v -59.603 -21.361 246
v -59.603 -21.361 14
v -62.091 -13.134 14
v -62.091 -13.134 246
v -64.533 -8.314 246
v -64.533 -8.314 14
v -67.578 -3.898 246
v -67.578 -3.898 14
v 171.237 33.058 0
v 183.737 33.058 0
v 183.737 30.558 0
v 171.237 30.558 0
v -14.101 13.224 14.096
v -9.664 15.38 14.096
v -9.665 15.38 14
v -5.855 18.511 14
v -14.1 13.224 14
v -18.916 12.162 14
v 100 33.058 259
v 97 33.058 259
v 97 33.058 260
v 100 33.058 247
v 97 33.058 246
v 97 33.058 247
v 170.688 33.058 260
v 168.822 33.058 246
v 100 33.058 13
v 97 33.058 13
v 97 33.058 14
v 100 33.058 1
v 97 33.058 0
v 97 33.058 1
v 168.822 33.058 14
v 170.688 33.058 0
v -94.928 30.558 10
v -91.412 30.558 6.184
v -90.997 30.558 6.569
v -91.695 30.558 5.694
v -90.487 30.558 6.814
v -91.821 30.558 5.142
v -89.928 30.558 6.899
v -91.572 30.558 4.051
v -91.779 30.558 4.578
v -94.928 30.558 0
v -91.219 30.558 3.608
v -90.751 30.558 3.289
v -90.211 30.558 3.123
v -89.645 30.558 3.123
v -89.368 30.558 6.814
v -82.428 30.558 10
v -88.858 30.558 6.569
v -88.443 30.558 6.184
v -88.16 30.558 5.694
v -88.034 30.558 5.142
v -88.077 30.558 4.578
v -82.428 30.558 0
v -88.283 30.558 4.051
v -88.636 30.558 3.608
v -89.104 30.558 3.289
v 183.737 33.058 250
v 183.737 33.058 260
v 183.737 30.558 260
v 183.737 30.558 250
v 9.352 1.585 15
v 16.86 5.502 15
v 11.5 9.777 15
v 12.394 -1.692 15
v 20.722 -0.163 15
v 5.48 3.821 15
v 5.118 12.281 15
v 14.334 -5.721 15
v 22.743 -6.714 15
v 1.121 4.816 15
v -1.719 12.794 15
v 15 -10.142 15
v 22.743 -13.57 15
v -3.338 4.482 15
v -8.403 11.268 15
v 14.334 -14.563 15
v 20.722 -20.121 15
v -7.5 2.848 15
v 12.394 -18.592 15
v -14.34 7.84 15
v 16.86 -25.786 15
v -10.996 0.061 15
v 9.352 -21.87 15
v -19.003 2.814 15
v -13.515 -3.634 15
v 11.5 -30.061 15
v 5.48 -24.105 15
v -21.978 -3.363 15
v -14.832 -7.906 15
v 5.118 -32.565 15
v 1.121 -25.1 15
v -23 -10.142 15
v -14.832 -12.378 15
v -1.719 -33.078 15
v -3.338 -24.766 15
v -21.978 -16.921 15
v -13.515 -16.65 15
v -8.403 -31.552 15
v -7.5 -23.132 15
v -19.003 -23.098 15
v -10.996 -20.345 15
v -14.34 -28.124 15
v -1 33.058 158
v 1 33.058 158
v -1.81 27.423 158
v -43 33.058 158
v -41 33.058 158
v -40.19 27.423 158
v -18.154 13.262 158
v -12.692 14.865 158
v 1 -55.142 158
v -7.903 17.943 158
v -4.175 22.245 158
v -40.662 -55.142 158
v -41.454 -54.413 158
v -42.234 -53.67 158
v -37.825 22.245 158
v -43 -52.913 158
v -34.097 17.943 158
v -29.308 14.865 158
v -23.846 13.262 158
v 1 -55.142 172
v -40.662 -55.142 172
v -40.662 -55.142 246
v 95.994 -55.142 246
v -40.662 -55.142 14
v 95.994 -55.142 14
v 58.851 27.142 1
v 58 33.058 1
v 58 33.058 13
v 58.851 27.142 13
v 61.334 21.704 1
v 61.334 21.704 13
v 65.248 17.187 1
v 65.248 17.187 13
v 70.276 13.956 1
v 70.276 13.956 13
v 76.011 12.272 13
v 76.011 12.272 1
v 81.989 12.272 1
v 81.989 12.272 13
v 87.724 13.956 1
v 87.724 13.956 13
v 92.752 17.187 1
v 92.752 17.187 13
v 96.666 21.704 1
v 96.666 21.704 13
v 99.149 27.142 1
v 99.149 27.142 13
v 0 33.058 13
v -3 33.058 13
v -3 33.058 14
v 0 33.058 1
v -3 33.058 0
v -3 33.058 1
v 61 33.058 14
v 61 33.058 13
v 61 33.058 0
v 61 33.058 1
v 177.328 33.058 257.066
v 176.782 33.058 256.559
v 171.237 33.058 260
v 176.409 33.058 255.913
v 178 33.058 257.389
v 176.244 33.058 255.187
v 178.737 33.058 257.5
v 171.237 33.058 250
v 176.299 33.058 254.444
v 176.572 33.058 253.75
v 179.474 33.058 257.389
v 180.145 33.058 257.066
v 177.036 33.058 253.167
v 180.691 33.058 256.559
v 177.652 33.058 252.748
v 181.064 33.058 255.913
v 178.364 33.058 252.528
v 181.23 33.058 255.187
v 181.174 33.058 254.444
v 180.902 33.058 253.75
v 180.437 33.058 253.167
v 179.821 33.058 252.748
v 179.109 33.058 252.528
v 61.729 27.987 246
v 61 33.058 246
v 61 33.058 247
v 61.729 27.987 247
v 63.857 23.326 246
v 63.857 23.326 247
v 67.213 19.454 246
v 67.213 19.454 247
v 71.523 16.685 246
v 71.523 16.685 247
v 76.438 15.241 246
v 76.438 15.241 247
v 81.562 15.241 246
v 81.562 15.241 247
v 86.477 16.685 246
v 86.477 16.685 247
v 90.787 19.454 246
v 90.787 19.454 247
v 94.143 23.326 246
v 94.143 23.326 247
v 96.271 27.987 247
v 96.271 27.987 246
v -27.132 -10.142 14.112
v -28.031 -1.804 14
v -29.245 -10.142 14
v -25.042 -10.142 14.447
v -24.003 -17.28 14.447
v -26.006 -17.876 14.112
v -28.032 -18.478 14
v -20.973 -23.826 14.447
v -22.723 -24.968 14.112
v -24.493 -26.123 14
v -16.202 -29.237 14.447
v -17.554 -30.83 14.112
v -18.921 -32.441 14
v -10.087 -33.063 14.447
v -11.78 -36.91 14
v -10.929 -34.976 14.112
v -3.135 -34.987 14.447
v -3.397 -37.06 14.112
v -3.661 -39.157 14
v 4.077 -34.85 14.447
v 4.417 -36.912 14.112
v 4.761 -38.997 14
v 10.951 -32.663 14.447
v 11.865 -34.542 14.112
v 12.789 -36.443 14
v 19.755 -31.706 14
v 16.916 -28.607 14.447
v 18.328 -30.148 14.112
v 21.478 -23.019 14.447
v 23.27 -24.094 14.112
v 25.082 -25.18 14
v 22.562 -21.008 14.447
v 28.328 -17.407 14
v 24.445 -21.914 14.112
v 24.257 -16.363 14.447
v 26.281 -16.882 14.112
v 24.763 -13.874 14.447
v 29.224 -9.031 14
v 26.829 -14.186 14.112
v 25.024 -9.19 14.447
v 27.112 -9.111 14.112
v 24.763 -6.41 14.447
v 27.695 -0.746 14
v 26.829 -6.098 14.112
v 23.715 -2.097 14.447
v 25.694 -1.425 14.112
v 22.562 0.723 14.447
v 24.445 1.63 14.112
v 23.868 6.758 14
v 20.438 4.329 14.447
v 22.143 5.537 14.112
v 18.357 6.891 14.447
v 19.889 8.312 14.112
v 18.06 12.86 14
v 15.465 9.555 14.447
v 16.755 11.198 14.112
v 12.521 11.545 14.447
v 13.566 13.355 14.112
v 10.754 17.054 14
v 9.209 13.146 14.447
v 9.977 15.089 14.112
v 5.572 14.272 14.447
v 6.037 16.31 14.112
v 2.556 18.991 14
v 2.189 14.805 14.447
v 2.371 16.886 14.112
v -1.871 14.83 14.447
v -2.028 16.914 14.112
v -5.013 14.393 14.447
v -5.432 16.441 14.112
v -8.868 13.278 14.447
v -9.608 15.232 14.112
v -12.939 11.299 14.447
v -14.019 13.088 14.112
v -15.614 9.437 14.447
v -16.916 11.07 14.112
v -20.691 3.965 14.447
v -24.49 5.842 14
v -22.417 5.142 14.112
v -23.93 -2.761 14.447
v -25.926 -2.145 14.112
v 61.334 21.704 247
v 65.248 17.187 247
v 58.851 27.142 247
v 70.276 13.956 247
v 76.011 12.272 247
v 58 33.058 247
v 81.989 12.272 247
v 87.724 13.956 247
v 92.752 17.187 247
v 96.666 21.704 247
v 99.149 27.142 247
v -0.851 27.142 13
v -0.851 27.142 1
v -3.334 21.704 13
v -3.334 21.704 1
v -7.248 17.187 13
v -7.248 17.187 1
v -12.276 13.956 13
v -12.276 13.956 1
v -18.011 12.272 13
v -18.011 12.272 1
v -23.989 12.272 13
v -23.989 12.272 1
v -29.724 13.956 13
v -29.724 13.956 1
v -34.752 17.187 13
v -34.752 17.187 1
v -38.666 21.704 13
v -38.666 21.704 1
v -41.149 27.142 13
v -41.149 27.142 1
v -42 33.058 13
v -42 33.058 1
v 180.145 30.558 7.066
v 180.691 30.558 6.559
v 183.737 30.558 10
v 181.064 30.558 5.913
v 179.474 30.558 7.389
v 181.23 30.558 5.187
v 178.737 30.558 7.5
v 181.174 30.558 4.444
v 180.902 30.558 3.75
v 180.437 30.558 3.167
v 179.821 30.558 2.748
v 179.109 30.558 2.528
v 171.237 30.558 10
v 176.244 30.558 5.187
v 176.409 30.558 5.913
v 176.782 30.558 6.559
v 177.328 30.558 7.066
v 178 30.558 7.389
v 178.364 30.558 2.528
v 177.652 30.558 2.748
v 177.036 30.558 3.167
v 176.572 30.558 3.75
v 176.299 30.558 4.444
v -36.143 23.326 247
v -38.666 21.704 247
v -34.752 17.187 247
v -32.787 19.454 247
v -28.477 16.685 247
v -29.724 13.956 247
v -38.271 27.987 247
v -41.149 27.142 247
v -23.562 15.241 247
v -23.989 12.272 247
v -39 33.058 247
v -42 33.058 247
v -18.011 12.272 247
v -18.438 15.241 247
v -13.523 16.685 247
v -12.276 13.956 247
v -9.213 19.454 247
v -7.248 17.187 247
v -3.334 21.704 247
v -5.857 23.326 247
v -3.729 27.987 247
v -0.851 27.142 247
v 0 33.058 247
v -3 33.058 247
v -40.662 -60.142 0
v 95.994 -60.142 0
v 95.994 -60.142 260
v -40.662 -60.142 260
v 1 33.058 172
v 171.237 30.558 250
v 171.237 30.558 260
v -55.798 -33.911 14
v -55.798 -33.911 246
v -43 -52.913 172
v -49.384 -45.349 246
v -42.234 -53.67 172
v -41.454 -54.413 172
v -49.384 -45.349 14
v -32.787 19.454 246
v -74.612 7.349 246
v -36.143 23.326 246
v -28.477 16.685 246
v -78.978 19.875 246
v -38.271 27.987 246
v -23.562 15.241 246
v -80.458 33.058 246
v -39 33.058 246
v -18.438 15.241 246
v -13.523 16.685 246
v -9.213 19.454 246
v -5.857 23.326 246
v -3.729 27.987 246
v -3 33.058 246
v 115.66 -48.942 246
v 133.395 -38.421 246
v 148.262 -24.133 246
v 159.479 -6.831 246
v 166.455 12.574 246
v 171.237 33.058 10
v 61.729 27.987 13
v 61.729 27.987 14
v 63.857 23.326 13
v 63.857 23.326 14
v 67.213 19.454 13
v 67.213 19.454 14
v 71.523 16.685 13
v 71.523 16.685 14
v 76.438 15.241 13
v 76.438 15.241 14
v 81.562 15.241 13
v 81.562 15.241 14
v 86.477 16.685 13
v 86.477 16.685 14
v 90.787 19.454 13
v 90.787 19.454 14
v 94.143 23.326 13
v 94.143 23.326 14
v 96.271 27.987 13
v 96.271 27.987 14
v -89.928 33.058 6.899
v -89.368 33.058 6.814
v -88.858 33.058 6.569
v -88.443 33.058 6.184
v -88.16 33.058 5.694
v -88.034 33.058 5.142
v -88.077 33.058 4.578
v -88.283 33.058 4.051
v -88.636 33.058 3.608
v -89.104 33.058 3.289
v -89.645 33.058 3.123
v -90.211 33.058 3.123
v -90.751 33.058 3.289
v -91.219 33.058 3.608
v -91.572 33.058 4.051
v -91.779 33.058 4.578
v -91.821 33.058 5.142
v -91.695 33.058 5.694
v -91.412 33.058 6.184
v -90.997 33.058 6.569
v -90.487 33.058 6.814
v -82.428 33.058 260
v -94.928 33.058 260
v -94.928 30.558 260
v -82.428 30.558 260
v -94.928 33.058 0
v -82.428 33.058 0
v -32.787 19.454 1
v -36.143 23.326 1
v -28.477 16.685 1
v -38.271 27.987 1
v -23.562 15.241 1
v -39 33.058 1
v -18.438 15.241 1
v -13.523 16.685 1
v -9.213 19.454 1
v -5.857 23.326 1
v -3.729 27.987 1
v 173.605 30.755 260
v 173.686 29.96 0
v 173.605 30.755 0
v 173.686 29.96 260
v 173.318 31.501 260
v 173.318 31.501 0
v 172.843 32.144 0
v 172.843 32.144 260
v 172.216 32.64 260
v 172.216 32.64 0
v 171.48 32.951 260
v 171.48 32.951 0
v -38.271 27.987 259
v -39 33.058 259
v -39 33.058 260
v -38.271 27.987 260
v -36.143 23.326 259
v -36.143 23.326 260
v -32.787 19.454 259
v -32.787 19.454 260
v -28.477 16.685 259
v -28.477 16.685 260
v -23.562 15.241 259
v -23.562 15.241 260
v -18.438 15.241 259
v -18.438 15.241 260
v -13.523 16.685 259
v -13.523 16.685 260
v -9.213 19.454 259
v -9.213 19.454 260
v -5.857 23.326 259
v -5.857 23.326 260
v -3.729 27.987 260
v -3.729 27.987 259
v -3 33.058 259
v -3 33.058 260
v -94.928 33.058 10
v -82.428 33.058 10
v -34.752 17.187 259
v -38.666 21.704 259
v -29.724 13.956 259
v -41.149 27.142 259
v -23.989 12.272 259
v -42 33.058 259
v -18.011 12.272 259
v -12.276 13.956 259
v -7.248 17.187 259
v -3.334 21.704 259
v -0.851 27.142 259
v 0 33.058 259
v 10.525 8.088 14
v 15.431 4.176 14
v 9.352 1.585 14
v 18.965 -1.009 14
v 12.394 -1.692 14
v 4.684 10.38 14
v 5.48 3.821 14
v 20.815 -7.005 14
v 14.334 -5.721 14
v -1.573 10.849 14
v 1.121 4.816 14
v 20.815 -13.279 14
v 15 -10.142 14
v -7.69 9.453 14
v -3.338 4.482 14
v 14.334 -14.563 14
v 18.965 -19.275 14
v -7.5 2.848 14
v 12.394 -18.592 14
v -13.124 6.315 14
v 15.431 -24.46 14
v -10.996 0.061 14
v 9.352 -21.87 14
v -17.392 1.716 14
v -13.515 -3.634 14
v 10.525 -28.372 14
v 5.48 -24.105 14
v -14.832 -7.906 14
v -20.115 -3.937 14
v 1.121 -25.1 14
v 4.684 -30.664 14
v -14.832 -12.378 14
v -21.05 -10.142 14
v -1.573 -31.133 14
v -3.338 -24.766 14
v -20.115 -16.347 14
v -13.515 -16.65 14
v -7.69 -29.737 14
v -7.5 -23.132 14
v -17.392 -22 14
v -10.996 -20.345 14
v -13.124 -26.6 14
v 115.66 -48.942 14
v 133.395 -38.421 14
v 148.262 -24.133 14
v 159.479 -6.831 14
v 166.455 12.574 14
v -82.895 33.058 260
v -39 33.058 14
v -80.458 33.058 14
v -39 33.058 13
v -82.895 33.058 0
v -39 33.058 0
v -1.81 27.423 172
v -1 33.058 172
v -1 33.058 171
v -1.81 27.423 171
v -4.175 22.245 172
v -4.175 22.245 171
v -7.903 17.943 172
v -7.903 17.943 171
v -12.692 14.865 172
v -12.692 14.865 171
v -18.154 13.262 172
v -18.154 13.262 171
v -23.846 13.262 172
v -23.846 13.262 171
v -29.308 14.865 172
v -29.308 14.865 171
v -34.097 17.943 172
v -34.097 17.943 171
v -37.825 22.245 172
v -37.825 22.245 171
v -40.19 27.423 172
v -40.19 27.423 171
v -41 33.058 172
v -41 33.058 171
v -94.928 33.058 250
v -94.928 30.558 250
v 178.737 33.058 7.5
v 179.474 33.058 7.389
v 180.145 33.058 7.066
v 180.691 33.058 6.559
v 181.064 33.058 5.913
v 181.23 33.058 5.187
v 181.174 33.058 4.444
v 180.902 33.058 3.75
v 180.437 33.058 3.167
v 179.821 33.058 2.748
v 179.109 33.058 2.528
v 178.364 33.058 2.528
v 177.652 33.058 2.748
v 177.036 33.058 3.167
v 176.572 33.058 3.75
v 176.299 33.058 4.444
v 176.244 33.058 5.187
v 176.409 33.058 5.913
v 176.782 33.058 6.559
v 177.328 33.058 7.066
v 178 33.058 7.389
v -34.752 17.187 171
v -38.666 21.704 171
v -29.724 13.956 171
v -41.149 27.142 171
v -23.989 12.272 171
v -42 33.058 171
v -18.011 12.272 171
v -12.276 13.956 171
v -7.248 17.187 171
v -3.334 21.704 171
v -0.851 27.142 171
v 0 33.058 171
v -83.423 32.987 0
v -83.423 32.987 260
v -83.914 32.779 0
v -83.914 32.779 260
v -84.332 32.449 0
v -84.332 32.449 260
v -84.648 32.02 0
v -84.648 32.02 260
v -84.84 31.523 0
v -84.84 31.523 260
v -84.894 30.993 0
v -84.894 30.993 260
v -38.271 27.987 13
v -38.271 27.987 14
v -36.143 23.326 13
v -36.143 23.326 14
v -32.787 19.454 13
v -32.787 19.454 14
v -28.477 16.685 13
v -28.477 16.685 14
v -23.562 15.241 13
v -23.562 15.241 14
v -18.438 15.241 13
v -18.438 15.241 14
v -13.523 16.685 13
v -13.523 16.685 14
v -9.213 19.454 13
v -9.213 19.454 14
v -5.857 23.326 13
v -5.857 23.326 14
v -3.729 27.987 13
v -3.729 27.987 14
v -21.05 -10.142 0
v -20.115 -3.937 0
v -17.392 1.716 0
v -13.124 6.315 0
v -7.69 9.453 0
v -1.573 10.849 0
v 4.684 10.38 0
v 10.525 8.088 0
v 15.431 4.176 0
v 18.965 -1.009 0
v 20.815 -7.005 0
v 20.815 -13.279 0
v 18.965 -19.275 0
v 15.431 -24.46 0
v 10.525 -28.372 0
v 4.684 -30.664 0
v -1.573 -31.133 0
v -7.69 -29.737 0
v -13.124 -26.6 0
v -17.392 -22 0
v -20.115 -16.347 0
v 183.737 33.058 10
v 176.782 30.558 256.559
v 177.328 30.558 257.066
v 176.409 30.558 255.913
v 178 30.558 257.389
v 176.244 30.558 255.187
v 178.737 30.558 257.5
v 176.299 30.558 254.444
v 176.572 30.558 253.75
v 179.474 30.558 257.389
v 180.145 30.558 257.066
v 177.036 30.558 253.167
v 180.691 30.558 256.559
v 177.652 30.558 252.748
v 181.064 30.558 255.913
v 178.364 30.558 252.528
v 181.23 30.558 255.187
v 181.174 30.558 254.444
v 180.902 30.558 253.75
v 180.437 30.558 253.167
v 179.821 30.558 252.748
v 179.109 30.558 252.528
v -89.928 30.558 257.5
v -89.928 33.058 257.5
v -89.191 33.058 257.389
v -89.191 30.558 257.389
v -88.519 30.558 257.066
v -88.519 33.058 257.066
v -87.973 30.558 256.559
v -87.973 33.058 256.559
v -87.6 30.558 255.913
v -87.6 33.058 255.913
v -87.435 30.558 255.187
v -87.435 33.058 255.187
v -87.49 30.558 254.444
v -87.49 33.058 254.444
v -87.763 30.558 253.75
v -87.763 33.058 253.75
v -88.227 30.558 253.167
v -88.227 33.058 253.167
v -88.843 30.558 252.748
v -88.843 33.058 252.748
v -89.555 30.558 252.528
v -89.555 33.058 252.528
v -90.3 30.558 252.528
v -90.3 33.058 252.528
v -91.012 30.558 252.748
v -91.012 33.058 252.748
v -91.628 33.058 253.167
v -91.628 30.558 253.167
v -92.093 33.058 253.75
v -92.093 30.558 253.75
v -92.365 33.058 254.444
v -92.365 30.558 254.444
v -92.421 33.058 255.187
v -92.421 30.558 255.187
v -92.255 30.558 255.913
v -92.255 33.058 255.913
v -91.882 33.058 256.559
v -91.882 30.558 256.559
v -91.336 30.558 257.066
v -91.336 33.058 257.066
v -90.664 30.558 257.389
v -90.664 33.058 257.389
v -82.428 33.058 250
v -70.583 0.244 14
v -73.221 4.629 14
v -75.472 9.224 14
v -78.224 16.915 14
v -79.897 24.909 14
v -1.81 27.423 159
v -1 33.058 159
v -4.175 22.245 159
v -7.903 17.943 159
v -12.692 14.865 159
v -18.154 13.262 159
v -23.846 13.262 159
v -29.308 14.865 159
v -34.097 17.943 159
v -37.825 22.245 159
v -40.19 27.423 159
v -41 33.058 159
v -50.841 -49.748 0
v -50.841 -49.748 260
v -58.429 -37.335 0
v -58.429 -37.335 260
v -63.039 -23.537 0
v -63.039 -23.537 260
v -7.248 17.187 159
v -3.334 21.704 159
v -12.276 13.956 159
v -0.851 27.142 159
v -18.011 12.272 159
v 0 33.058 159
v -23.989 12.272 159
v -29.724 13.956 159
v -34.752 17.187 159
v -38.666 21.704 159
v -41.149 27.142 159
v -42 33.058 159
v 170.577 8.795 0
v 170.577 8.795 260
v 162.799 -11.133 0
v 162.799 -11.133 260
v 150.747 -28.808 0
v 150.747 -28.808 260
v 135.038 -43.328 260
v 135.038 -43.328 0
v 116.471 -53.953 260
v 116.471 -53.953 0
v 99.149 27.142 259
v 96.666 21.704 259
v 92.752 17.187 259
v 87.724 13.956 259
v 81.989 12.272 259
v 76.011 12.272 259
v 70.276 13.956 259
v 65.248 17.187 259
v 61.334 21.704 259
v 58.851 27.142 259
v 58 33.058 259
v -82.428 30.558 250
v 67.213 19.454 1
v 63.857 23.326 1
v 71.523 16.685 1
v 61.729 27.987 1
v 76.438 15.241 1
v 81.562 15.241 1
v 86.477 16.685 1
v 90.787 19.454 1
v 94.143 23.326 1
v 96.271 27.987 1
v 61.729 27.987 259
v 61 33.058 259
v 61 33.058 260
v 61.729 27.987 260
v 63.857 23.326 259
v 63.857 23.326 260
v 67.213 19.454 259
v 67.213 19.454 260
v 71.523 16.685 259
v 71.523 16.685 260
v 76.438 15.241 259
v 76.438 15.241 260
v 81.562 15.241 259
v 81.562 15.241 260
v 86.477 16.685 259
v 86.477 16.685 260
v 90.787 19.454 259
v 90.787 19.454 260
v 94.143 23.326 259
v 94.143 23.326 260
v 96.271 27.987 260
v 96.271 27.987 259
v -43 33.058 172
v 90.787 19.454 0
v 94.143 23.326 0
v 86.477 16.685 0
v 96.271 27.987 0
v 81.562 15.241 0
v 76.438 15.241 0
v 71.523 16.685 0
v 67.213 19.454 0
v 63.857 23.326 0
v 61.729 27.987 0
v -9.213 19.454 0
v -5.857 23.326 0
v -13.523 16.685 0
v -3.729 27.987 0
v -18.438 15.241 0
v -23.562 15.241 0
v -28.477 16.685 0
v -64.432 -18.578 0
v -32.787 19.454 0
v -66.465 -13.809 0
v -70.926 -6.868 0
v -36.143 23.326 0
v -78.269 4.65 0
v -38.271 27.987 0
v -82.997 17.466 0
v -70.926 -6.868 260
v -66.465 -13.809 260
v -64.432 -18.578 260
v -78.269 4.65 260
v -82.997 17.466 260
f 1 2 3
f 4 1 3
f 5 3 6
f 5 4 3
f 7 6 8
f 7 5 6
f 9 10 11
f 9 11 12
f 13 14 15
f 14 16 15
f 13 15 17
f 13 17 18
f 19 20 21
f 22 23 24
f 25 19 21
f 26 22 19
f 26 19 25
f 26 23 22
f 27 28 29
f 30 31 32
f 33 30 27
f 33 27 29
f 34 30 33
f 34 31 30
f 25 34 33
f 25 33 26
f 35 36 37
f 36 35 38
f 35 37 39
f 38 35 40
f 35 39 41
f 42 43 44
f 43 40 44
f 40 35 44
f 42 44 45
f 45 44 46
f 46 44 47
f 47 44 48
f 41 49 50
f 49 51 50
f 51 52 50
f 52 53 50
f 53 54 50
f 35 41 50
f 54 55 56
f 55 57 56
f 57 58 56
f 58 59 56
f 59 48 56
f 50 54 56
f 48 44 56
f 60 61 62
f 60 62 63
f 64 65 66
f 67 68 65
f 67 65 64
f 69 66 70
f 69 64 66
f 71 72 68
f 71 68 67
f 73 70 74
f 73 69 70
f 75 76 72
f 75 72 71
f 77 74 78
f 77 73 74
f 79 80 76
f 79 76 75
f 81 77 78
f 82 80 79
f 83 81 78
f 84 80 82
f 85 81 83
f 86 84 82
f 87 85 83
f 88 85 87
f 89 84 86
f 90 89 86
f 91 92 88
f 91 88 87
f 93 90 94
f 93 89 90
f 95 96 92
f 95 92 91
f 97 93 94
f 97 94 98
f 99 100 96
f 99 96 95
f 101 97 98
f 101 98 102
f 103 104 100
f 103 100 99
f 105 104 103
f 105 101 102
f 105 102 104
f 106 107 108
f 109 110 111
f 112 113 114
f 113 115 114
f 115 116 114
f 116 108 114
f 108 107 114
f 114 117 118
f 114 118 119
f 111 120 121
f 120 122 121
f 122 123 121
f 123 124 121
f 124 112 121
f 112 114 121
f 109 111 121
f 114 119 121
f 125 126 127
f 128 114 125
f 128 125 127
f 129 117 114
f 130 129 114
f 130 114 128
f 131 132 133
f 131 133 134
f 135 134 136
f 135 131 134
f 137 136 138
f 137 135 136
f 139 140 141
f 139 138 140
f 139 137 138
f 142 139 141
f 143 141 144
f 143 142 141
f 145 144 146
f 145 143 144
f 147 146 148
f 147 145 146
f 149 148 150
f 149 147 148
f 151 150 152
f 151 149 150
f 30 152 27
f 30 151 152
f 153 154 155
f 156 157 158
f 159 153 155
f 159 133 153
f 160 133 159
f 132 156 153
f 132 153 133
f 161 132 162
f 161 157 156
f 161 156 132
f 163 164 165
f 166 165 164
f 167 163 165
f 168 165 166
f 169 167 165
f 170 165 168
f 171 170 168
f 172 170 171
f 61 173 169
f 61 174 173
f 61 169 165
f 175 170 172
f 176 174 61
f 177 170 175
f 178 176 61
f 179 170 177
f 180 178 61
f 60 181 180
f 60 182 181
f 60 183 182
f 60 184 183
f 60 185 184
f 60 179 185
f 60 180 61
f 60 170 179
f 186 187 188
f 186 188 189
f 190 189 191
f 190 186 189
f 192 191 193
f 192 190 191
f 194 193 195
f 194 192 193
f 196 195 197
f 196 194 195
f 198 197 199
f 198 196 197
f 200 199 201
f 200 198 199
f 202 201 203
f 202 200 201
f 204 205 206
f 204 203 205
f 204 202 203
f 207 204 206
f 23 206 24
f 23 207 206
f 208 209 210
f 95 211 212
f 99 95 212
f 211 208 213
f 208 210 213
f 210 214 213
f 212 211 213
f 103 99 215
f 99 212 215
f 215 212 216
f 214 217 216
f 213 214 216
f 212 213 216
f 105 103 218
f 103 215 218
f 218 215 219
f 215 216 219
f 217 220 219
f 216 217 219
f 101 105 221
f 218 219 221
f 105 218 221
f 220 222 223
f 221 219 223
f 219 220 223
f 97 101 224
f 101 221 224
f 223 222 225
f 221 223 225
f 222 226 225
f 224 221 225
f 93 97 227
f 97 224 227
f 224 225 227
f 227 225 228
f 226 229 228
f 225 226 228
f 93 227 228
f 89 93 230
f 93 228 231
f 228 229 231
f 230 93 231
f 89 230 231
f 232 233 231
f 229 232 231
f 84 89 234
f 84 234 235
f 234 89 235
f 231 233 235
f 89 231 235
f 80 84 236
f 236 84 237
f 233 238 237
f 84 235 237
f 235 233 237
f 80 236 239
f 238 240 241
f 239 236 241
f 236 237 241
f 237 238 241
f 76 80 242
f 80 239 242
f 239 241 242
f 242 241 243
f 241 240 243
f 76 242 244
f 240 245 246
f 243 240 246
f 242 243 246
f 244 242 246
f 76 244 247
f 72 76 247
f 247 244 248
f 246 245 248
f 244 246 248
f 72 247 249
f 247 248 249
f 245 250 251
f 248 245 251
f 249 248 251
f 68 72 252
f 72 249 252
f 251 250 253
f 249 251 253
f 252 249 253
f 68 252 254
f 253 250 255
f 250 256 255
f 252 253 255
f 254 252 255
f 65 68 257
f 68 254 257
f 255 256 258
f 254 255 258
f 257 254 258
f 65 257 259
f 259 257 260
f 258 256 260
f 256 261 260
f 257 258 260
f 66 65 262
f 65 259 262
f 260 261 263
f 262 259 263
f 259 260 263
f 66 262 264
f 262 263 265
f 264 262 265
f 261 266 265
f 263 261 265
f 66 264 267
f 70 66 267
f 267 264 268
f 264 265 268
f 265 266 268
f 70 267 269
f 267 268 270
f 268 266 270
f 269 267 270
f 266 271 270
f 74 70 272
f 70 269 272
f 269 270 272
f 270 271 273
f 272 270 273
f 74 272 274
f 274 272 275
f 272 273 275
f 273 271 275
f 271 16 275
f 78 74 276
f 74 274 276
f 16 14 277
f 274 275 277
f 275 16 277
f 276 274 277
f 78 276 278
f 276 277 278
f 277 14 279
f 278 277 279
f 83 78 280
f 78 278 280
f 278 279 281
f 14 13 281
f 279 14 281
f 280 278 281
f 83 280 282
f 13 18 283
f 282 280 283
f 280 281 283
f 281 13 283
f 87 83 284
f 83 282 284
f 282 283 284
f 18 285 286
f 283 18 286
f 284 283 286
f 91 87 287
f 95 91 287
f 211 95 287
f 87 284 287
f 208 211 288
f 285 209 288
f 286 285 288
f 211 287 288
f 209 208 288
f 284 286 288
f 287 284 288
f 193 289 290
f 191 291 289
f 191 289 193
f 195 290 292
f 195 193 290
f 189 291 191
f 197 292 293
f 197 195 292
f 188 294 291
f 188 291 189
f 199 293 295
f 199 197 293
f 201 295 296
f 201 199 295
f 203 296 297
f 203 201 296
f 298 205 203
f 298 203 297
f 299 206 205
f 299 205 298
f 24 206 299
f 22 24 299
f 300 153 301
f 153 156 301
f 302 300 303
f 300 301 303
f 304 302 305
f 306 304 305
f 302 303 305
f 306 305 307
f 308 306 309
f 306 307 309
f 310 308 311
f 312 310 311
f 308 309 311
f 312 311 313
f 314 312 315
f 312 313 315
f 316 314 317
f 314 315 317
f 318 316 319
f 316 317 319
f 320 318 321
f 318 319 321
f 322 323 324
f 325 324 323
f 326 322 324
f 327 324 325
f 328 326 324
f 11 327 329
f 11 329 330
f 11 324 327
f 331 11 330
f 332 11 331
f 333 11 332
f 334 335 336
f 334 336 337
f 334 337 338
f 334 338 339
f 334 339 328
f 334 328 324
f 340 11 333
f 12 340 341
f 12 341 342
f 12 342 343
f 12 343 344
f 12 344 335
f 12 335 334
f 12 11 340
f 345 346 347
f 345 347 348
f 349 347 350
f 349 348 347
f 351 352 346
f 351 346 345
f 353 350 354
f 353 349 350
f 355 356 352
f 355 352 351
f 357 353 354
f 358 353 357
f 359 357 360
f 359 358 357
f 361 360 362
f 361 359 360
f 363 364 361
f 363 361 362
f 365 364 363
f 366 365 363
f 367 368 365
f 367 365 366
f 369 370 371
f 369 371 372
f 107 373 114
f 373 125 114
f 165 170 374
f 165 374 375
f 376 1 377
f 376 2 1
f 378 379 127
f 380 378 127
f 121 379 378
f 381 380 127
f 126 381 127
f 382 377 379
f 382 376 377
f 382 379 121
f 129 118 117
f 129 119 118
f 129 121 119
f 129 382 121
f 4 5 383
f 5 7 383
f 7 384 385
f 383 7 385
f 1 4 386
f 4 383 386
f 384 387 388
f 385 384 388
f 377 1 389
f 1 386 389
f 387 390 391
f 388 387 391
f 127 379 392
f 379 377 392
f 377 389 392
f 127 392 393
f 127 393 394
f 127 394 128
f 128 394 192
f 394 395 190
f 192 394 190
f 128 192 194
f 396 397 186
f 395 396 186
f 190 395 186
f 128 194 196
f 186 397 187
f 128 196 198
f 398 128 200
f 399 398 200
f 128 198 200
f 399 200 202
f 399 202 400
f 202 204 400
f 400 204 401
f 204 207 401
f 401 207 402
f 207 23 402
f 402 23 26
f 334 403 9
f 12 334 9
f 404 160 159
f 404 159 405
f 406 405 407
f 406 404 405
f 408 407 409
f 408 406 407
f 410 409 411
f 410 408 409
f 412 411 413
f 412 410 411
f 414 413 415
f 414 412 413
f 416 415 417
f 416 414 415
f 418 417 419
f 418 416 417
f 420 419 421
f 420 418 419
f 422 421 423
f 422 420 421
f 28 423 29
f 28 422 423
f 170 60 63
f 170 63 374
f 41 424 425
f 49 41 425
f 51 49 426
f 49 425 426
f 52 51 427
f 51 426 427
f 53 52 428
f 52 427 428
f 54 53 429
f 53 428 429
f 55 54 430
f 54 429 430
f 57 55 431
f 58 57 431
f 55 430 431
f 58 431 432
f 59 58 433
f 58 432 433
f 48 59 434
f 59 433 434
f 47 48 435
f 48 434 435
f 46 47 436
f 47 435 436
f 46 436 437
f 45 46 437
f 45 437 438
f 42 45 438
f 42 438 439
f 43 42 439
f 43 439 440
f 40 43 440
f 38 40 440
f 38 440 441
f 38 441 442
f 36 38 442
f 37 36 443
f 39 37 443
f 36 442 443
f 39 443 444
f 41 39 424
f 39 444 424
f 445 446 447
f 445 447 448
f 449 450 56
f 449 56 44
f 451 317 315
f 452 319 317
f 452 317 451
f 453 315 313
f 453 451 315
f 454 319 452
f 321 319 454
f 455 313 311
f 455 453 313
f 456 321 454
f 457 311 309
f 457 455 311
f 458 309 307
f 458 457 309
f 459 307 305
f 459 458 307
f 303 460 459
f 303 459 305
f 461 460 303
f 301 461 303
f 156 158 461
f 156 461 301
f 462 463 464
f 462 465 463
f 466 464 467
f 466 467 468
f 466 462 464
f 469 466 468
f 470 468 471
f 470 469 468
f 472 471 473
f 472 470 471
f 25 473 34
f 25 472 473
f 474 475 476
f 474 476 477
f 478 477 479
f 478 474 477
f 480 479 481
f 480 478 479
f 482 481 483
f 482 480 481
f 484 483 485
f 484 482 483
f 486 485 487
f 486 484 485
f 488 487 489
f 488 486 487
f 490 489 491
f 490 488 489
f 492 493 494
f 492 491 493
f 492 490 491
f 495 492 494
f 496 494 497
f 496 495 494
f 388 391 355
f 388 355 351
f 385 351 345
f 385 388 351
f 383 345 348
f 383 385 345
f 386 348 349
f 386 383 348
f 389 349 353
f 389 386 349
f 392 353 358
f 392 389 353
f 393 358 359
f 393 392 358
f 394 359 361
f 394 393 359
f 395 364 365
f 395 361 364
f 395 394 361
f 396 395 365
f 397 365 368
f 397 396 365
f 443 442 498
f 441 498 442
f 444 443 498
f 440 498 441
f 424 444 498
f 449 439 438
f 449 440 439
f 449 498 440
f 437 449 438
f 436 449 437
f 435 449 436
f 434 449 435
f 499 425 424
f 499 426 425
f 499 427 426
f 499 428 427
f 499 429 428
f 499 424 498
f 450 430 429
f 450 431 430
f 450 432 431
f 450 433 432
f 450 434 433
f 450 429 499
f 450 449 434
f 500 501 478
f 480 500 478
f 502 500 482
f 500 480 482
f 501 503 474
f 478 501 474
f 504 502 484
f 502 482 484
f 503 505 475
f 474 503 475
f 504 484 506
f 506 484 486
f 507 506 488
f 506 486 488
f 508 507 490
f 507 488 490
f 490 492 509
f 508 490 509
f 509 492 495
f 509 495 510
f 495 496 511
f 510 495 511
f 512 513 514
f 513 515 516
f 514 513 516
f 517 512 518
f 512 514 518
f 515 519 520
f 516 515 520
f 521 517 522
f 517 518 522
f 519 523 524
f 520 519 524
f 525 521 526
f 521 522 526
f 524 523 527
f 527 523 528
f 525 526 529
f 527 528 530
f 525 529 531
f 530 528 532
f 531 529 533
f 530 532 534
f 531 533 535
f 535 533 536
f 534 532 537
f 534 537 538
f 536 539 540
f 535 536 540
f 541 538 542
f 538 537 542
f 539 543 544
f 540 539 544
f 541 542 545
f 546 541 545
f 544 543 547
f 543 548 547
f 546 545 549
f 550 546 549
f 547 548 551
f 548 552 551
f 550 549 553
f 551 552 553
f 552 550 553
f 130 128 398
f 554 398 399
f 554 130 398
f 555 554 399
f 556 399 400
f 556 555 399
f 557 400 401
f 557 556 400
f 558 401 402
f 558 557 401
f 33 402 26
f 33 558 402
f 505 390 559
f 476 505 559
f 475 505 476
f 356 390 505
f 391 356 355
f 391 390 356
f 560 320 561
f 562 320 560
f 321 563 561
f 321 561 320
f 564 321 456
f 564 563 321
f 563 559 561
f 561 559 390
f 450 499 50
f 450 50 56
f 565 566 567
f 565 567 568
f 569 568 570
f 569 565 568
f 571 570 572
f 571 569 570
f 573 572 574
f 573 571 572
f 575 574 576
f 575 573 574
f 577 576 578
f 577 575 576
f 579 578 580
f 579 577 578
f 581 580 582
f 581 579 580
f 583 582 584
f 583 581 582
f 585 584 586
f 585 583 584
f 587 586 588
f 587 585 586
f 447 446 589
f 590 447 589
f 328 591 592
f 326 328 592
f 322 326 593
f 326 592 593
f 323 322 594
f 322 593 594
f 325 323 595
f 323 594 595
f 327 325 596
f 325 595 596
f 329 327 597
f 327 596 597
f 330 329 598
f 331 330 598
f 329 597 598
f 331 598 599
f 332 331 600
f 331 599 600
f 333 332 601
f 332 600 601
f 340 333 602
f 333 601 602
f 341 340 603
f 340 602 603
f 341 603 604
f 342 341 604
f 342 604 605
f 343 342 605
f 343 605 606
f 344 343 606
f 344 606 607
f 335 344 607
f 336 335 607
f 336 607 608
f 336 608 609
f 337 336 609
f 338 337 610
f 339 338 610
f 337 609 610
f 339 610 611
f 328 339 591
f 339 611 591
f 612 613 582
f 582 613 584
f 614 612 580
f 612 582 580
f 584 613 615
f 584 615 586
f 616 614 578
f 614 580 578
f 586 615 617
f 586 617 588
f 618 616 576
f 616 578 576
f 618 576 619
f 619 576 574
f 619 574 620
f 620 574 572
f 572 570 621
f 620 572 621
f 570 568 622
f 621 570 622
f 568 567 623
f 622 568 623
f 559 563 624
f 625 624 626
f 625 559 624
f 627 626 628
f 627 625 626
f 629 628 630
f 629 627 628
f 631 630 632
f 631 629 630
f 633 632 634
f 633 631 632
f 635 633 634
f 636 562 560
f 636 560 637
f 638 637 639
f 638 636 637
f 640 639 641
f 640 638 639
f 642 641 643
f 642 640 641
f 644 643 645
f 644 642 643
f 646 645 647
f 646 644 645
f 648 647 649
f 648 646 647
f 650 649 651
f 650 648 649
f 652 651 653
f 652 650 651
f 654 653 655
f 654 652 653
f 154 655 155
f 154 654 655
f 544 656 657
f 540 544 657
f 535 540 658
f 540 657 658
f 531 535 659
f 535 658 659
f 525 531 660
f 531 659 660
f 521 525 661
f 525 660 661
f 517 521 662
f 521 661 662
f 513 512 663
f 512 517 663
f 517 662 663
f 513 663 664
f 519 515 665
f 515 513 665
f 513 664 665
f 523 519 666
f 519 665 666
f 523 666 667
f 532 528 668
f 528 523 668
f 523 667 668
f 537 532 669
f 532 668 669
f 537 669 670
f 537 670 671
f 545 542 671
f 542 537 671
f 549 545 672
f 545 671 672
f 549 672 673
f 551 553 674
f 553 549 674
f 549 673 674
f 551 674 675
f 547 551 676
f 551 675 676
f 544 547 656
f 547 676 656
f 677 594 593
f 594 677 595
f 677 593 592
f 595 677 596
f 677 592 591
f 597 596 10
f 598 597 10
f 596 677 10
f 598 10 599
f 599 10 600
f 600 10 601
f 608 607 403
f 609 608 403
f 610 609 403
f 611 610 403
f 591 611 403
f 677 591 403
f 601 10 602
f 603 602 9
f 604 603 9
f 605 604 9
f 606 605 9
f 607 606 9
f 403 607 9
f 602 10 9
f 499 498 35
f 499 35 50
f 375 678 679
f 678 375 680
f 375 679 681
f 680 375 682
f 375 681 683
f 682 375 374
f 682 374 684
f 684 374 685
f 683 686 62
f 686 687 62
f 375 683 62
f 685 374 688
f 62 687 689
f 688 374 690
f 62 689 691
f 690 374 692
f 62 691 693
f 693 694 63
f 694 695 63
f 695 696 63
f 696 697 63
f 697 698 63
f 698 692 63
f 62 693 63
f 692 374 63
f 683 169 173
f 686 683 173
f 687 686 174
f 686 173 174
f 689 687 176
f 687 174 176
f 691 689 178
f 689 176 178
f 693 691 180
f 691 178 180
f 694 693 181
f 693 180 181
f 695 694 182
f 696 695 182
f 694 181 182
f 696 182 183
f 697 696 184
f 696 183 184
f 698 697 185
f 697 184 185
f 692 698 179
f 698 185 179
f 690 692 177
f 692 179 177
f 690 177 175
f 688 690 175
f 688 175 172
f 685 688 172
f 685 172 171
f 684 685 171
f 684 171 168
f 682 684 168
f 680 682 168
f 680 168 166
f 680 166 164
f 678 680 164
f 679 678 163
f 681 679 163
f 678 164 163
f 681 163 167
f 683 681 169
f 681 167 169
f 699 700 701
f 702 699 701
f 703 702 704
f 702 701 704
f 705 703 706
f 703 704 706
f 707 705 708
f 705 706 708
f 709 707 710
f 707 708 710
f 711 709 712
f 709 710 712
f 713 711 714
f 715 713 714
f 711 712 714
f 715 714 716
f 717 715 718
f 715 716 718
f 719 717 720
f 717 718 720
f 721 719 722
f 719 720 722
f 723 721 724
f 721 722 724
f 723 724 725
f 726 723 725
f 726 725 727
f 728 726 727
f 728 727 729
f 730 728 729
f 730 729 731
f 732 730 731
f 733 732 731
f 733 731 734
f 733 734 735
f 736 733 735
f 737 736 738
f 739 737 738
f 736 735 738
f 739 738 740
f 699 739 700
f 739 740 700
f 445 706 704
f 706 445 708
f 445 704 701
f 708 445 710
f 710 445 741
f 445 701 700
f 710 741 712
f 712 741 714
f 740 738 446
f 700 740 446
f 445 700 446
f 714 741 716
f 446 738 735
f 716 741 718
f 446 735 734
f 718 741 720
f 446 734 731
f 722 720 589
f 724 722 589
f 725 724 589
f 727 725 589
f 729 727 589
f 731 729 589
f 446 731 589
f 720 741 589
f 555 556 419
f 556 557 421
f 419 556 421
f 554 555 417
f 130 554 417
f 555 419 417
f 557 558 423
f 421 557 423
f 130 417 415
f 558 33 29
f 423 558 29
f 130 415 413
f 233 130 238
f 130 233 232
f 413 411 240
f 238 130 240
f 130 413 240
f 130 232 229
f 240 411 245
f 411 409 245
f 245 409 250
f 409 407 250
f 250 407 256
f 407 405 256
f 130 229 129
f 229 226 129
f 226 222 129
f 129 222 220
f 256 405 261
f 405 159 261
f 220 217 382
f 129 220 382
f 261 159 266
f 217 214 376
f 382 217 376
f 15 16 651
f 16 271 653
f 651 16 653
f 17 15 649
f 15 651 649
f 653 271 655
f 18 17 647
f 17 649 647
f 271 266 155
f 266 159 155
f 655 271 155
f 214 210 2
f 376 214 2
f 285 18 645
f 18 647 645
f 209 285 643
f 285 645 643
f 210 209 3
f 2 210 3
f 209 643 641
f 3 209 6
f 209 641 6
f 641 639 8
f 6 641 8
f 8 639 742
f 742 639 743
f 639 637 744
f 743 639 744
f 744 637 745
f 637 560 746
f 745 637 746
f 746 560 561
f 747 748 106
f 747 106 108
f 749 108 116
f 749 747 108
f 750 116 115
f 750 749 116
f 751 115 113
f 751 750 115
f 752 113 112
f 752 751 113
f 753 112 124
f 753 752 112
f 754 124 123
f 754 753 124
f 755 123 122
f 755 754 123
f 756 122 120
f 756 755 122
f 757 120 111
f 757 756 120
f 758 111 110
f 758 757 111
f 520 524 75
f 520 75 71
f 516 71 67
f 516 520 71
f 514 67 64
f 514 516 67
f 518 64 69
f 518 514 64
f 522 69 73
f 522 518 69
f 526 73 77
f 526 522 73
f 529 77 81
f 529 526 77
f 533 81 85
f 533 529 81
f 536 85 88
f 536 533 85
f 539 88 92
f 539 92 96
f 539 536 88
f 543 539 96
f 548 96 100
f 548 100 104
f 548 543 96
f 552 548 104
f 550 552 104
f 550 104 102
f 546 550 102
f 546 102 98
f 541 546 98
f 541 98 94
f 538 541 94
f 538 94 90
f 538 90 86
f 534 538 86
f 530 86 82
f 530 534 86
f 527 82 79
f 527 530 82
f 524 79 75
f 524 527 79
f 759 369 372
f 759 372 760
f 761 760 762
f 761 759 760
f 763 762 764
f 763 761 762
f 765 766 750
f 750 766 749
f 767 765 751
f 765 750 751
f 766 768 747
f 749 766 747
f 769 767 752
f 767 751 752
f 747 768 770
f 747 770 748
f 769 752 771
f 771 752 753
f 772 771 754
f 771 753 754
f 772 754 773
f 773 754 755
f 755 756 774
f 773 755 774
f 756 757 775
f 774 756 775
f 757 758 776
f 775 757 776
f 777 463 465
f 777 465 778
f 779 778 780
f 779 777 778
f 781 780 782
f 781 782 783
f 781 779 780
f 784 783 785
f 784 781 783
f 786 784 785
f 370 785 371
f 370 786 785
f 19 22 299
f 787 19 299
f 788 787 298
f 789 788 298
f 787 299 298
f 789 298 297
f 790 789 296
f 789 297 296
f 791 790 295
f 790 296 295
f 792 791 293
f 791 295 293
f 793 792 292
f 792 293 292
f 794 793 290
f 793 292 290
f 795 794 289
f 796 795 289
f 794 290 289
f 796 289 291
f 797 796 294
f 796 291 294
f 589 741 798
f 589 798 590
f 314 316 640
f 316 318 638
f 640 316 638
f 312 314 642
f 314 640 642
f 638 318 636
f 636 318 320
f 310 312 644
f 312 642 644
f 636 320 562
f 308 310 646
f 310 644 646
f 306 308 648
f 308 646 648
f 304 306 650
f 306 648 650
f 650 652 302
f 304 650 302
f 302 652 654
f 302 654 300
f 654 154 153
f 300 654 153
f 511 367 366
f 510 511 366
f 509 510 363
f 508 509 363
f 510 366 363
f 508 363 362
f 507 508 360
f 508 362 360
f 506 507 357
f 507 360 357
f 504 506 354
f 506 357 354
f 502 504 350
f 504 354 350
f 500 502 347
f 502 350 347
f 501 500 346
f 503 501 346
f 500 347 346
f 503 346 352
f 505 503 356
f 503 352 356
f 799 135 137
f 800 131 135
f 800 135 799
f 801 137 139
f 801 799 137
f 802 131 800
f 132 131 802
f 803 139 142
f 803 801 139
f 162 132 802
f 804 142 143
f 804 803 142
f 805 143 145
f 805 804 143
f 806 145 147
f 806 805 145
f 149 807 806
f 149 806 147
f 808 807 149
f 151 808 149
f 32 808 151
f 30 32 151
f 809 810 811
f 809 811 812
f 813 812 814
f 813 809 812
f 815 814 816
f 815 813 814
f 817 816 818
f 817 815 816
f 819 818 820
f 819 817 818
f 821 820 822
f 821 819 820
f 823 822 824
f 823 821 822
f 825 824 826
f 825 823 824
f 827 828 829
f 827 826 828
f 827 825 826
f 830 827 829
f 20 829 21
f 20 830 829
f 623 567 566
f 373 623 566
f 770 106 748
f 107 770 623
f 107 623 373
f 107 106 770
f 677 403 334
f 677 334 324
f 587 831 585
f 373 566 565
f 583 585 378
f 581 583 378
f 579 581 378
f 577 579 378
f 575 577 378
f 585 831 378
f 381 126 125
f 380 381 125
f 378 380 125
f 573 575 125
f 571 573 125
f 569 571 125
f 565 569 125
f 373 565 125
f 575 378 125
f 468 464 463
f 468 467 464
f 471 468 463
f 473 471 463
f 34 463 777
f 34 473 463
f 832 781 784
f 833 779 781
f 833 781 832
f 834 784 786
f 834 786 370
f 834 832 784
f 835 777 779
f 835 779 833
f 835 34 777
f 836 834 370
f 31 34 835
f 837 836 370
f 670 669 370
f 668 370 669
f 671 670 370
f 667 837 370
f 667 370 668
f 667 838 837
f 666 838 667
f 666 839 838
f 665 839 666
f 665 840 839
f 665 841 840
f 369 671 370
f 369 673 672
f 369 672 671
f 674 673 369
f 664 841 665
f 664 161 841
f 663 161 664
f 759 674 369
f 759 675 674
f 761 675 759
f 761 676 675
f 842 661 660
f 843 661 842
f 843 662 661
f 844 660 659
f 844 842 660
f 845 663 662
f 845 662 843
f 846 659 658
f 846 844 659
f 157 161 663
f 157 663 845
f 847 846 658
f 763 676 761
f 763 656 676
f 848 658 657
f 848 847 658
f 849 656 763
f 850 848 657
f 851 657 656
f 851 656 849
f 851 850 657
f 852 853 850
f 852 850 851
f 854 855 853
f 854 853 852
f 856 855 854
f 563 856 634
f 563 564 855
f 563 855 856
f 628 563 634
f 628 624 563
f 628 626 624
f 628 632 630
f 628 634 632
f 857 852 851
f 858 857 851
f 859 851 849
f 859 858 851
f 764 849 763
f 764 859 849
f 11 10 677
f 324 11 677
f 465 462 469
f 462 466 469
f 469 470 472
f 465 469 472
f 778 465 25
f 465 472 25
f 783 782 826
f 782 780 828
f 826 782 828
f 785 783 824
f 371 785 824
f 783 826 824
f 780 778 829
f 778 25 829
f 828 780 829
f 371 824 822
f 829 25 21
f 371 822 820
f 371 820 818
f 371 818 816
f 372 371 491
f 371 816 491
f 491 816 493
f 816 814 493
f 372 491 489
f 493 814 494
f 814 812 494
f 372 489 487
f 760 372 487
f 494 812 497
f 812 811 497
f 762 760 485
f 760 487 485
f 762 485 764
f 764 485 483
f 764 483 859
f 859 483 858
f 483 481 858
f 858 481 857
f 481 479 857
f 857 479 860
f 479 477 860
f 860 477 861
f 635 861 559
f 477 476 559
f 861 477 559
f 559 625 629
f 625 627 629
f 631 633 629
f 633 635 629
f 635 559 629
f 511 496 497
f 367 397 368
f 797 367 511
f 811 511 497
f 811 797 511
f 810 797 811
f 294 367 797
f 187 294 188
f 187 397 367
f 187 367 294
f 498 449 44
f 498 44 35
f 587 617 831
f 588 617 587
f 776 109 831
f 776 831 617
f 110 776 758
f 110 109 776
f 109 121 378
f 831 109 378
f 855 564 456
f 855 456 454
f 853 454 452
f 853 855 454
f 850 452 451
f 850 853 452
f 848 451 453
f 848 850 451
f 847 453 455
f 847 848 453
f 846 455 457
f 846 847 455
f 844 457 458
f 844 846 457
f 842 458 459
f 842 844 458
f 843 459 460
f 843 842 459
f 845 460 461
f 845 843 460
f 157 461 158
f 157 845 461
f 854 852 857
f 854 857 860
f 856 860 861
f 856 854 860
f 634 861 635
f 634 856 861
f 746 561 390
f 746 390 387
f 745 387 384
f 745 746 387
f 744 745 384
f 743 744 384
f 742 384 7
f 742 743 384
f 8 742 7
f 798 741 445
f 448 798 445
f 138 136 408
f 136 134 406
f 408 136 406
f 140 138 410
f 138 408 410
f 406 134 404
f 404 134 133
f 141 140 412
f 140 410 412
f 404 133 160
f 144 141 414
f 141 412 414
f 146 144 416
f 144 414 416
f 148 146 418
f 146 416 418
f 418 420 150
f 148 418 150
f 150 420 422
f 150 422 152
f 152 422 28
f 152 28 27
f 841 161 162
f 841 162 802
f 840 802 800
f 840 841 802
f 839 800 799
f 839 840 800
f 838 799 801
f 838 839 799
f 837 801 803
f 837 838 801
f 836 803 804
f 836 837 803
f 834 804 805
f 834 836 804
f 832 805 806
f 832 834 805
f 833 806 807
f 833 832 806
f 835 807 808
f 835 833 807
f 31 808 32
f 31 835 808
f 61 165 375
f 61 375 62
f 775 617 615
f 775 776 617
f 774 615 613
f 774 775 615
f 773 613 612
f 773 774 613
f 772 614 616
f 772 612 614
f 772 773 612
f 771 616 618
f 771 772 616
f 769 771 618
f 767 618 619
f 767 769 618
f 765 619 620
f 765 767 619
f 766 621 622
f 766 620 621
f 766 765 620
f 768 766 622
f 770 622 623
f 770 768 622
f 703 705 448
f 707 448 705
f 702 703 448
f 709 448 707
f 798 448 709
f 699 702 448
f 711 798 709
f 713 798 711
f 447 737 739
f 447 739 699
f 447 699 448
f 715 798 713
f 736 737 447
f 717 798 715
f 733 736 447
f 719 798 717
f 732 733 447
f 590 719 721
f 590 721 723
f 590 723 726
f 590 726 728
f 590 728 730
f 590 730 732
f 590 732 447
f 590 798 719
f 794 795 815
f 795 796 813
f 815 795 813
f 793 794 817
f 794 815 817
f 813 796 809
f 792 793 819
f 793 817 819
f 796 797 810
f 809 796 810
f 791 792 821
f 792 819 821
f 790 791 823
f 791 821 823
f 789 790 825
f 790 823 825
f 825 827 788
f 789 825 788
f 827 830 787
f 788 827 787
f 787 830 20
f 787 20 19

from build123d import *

# Parameters (mm, degrees)
BOSS_EXTRUDE2_DEPTH     = 260
BOSS_EXTRUDE3_DEPTH     = 14
SKETCH32_R              = 2.5
BOSS_EXTRUDE13_DEPTH    = 2.5
BOSS_EXTRUDE13_2_DEPTH  = 2.5
BOSS_EXTRUDE13_3_DEPTH  = 2.5
SKETCH32_R_2            = 1.89867991
BOSS_EXTRUDE13_4_DEPTH  = 2.5
SKETCH6_R               = 21.05
CUT_EXTRUDE1_DEPTH      = 325.000361639
BOSS_EXTRUDE4_START     = -14
BOSS_EXTRUDE4_DEPTH     = 14
BOSS_EXTRUDE5_DEPTH     = 88.2
CUT_EXTRUDE4_DEPTH      = 259.766756641
CUT_EXTRUDE4_DEPTH_BACK = 259.766756641
SKETCH16_R              = 21
SKETCH19_W              = 44
SKETCH19_H              = 1
BOSS_EXTRUDE9_DEPTH     = 40
SKETCH21_W              = 42
SKETCH21_H              = 1
BOSS_EXTRUDE10_DEPTH    = 40
CUT_EXTRUDE5_DEPTH      = 250.680264223
CUT_EXTRUDE5_DEPTH_BACK = 250.680264223
SKETCH22_R              = 20
FILLET7_R               = 40
FILLET8_R               = 40
SKETCH26_R              = 23
SKETCH26_R_2            = 15
BOSS_EXTRUDE11_DEPTH    = 1
FILLET9_R               = 20
SKETCH27_W              = 142
SKETCH27_H              = 1
BOSS_EXTRUDE12_DEPTH    = 25
CUT_EXTRUDE7_DEPTH      = 325.000361738
CUT_EXTRUDE7_DEPTH_BACK = 325.000361738
SKETCH28_R              = 18
SKETCH31_R              = 21.05
CUT_EXTRUDE8_DEPTH      = 14
FILLET12_R              = 2
FILLET15_R              = 3


with BuildPart() as part:
    # Sketch4 → Boss-Extrude2 (new body)
    with BuildSketch(Plane.XY):
        with BuildLine():
            Line((0, -55.142064338), (95.994056336, -55.142064338))
            ThreePointArc((95.994056336, -55.142064338), (148.262119718, -24.132944056), (168.822257546, 33.057935662))
            Line((168.822257546, 33.057935662), (173.736676904, 33.057935662))
            ThreePointArc((173.736676904, 33.057935662), (151.749564862, -27.625989418), (95.994056336, -60.142064338))
            Line((95.994056336, -60.142064338), (-40.661605406, -60.142064338))
            ThreePointArc((-40.661605406, -60.142064338), (-57.355877726, -39.530317849), (-64.334580903, -13.940465884))
            ThreePointArc((-64.334580903, -13.940465884), (-79.553439665, 7.401935326), (-84.927581292, 33.057935662))
            Line((-84.927581292, 33.057935662), (-80.457592966, 33.057935662))
            ThreePointArc((-80.457592966, 33.057935662), (-75.277345345, 8.785005398), (-60.639261472, -11.25836282))
            ThreePointArc((-60.639261472, -11.25836282), (-55.198833523, -35.270831357), (-40.661605406, -55.142064338))
            Line((-40.661605406, -55.142064338), (0, -55.142064338))
        make_face()
    extrude(amount=BOSS_EXTRUDE2_DEPTH)

    # Sketch5 → Boss-Extrude3 (add)
    with BuildSketch(Plane(origin=(0, 0, 0), x_dir=(-1, 0, 0), z_dir=(0, 0, -1))):
        with BuildLine():
            ThreePointArc((-58, 33.057935662), (-79, 12.057935662), (-100, 33.057935662))
            Line((-100, 33.057935662), (-168.822257546, 33.057935662))
            ThreePointArc((-168.822257546, 33.057935662), (-148.262119718, -24.132944056), (-95.994056336, -55.142064338))
            Line((-95.994056336, -55.142064338), (40.661605406, -55.142064338))
            ThreePointArc((40.661605406, -55.142064338), (55.198833523, -35.270831357), (60.639261472, -11.25836282))
            ThreePointArc((60.639261472, -11.25836282), (69.157100692, -1.81467557), (75.471736637, 9.224445171))
            ThreePointArc((75.471736637, 9.224445171), (79.197782202, 20.883227942), (80.457592966, 33.057935662))
            Line((80.457592966, 33.057935662), (42, 33.057935662))
            ThreePointArc((42, 33.057935662), (21, 12.057935662), (0, 33.057935662))
            Line((0, 33.057935662), (-58, 33.057935662))
        make_face()
    extrude(amount=-BOSS_EXTRUDE3_DEPTH)

    # Sketch6 → Cut-Extrude1 (cut, through all)
    with BuildSketch(Plane(origin=(0, 0, 0), x_dir=(-1, 0, 0), z_dir=(0, 0, -1))):
        with Locations((0, -10.142064338)):
            Circle(SKETCH6_R)
    extrude(amount=-CUT_EXTRUDE1_DEPTH, mode=Mode.SUBTRACT)

    # Sketch8 → Boss-Extrude4 (add)
    with BuildSketch(Plane.XY.offset(260).offset(BOSS_EXTRUDE4_START)):
        with BuildLine():
            Line((-40.446345249, -56.420444517), (95.994056336, -55.142064338))
            ThreePointArc((95.994056336, -55.142064338), (148.262119718, -24.132944056), (168.822257546, 33.057935662))
            Line((168.822257546, 33.057935662), (100, 33.057935662))
            ThreePointArc((100, 33.057935662), (79, 12.057935662), (58, 33.057935662))
            Line((58, 33.057935662), (0, 33.057935662))
            ThreePointArc((0, 33.057935662), (-21, 12.057935662), (-42, 33.057935662))
            Line((-42, 33.057935662), (-80.457592966, 33.057935662))
            ThreePointArc((-80.457592966, 33.057935662), (-75.277345345, 8.785005398), (-60.639261472, -11.25836282))
            ThreePointArc((-60.639261472, -11.25836282), (-55.357730963, -35.99225903), (-40.446345249, -56.420444517))
        make_face()
    extrude(amount=BOSS_EXTRUDE4_DEPTH)

    # Sketch9 → Boss-Extrude5 (add)
    with BuildSketch(Plane(origin=(0, -55.142064338, 0), x_dir=(1, 0, 0), z_dir=(0, 1, 0))):
        Polygon((1, -158), (-21, -158), (-43, -158), (-43, -172), (1, -172), align=None)
    extrude(amount=BOSS_EXTRUDE5_DEPTH)

    # Sketch16 → Cut-Extrude4 (cut, two sides: drawn at the far end of the back side and taken through both)
    with BuildSketch(Plane.XY.offset(172).offset(-CUT_EXTRUDE4_DEPTH_BACK)):
        with Locations((-21, 33.057935662)):
            Circle(SKETCH16_R)
    extrude(amount=CUT_EXTRUDE4_DEPTH + CUT_EXTRUDE4_DEPTH_BACK, mode=Mode.SUBTRACT)

    # Sketch19 → Boss-Extrude9 (add)
    with BuildSketch(Plane(origin=(0, 33.057935662, 172), x_dir=(1, 0, 0), z_dir=(0, 1, 0))):
        with Locations((-21, 0.5)):
            Rectangle(SKETCH19_W, SKETCH19_H)
    extrude(amount=-BOSS_EXTRUDE9_DEPTH)

    # Sketch21 → Boss-Extrude10 (add)
    with BuildSketch(Plane(origin=(0, 33.057935662, 158), x_dir=(-1, 0, 0), z_dir=(0, -1, 0))):
        with Locations((21, -0.5)):
            Rectangle(SKETCH21_W, SKETCH21_H)
    extrude(amount=BOSS_EXTRUDE10_DEPTH)

    # Sketch22 → Cut-Extrude5 (cut, two sides: drawn at the far end of the back side and taken through both)
    with BuildSketch(Plane(origin=(0, 0, 158), x_dir=(-1, 0, 0), z_dir=(0, 0, -1)).offset(-CUT_EXTRUDE5_DEPTH_BACK)):
        with Locations((21, 33.057935662)):
            Circle(SKETCH22_R)
    extrude(amount=CUT_EXTRUDE5_DEPTH + CUT_EXTRUDE5_DEPTH_BACK, mode=Mode.SUBTRACT)

    # Fillet7
    fillet7_edges = [part.edges().sort_by_distance(p)[0] for p in [
        (-60.639261472, -11.25836282, 130),
    ]]
    fillet(fillet7_edges, radius=FILLET7_R)

    # Fillet8
    fillet8_edges = [part.edges().sort_by_distance(p)[0] for p in [
        (-64.334580903, -13.940465884, 130),
    ]]
    fillet(fillet8_edges, radius=FILLET8_R)

    # Sketch26 → Boss-Extrude11 (add)
    with BuildSketch(Plane.XY.offset(14)):
        with Locations(Location((0, -10.142064338, 0), (0, 0, 180))):
            Circle(SKETCH26_R)
        with Locations((0, -10.142064338)):
            Circle(SKETCH26_R_2, mode=Mode.SUBTRACT)
    extrude(amount=BOSS_EXTRUDE11_DEPTH)

    # Fillet9
    # the kernel refuses this fillet: 20 mm, written as the material it adds along each edge
    with BuildSketch(Plane(origin=(0, -10.142064338, 14), x_dir=(-1, 0, 0), z_dir=(0, 1, 0))) as fillet9_piece_1_section:
        with BuildLine():
            CenterArc((29.244997998, 20), FILLET9_R, 251.805127661, 18.194872339)
            Line((23, 1), (22.87510004, 0.62))
            ThreePointArc((22.87510004, 0.62), (22.6, 0.5), (22.6, 0))
            Line((22.6, 0), (23, -0.4))
            Line((23, -0.4), (29.244997998, -0.4))
            Line((29.244997998, -0.4), (29.244997998, 0))
        make_face()
    fillet9_piece_1 = revolve(axis=Axis((0, -10.142064338, 14), (0, 0, 1)), mode=Mode.PRIVATE)
    fillet9_piece_1 = fillet9_piece_1 - Plane(origin=(-21, 33.057935662, 14.160984857), x_dir=(-1, 0, 0), z_dir=(0, 0, -1)) * Cylinder(21, 117, mode=Mode.PRIVATE)
    add(fillet9_piece_1)

    # Sketch27 → Boss-Extrude12 (add)
    with BuildSketch(Plane(origin=(0, 33.057935662, 0), x_dir=(1, 0, 0), z_dir=(0, 1, 0))):
        with Locations((29, -0.5)):
            Rectangle(SKETCH27_W, SKETCH27_H)
        with Locations((29, -246.5)):
            Rectangle(SKETCH27_W, SKETCH27_H)
        with Locations((29, -13.5)):
            Rectangle(SKETCH27_W, SKETCH27_H)
        with Locations((29, -259.5)):
            Rectangle(SKETCH27_W, SKETCH27_H)
    extrude(amount=-BOSS_EXTRUDE12_DEPTH)

    # Sketch28 → Cut-Extrude7 (cut, two sides: drawn at the far end of the back side and taken through both)
    with BuildSketch(Plane.XY.offset(260).offset(-CUT_EXTRUDE7_DEPTH_BACK)):
        with Locations((-21, 33.057935662)):
            Circle(SKETCH28_R)
        with Locations((79, 33.057935662)):
            Circle(SKETCH28_R)
    extrude(amount=CUT_EXTRUDE7_DEPTH + CUT_EXTRUDE7_DEPTH_BACK, mode=Mode.SUBTRACT)

    # Sketch31 → Cut-Extrude8 (cut)
    with BuildSketch(Plane(origin=(0, 0, 0), x_dir=(-1, 0, 0), z_dir=(0, 0, -1))):
        with Locations((0, -10.142064338)):
            Circle(SKETCH31_R)
    extrude(amount=-CUT_EXTRUDE8_DEPTH, mode=Mode.SUBTRACT)

    # Fillet12
    fillet12_edges = [part.edges().sort_by_distance(p)[0] for p in [
        (-84.927581292, 33.057935662, 130),
    ]]
    fillet(fillet12_edges, radius=FILLET12_R)

    # Fillet15
    fillet15_edges = [part.edges().sort_by_distance(p)[0] for p in [
        (173.736676904, 33.057935662, 130),
    ]]
    fillet(fillet15_edges, radius=FILLET15_R)


with BuildPart() as body_2:
    # Sketch32 → Boss-Extrude13 (new body)
    with BuildSketch(Plane(origin=(0, 33.057935662, 0), x_dir=(1, 0, 0), z_dir=(0, 1, 0))):
        Polygon((173.736676904, -260), (183.736676904, -260), (183.736676904, -250), (173.736676904, -250), (171.236676904, -250), (171.236676904, -260), align=None)
        with Locations(Location((178.736676904, -255, 0), (0, 0, 270))):
            Circle(SKETCH32_R, mode=Mode.SUBTRACT)
    extrude(amount=-BOSS_EXTRUDE13_DEPTH)


with BuildPart() as body_3:
    # Sketch32 → Boss-Extrude13 2 (new body)
    with BuildSketch(Plane(origin=(0, 33.057935662, 0), x_dir=(1, 0, 0), z_dir=(0, 1, 0))):
        Polygon((173.736676904, 0), (183.736676904, 0), (183.736676904, -10), (173.736676904, -10), (171.236676904, -10), (171.236676904, 0), align=None)
        with Locations(Location((178.736676904, -5, 0), (0, 0, 270))):
            Circle(SKETCH32_R, mode=Mode.SUBTRACT)
    extrude(amount=-BOSS_EXTRUDE13_2_DEPTH)


with BuildPart() as body_4:
    # Sketch32 → Boss-Extrude13 3 (new body)
    with BuildSketch(Plane(origin=(0, 33.057935662, 0), x_dir=(1, 0, 0), z_dir=(0, 1, 0))):
        Polygon((-84.927581292, -260), (-94.927581292, -260), (-94.927581292, -250), (-84.927581292, -250), (-82.427581292, -250), (-82.427581292, -260), align=None)
        with Locations(Location((-89.927581292, -255, 0), (0, 0, 270))):
            Circle(SKETCH32_R, mode=Mode.SUBTRACT)
    extrude(amount=-BOSS_EXTRUDE13_3_DEPTH)


with BuildPart() as body_5:
    # Sketch32 → Boss-Extrude13 4 (new body)
    with BuildSketch(Plane(origin=(0, 33.057935662, 0), x_dir=(1, 0, 0), z_dir=(0, 1, 0))):
        Polygon((-84.927581292, 0), (-94.927581292, 0), (-94.927581292, -10), (-84.927581292, -10), (-82.427581292, -10), (-82.427581292, 0), align=None)
        with Locations(Location((-89.927581292, -5, 0), (0, 0, 270))):
            Circle(SKETCH32_R_2, mode=Mode.SUBTRACT)
    extrude(amount=-BOSS_EXTRUDE13_4_DEPTH)


solid = Compound([part.part, body_2.part, body_3.part, body_4.part, body_5.part])
